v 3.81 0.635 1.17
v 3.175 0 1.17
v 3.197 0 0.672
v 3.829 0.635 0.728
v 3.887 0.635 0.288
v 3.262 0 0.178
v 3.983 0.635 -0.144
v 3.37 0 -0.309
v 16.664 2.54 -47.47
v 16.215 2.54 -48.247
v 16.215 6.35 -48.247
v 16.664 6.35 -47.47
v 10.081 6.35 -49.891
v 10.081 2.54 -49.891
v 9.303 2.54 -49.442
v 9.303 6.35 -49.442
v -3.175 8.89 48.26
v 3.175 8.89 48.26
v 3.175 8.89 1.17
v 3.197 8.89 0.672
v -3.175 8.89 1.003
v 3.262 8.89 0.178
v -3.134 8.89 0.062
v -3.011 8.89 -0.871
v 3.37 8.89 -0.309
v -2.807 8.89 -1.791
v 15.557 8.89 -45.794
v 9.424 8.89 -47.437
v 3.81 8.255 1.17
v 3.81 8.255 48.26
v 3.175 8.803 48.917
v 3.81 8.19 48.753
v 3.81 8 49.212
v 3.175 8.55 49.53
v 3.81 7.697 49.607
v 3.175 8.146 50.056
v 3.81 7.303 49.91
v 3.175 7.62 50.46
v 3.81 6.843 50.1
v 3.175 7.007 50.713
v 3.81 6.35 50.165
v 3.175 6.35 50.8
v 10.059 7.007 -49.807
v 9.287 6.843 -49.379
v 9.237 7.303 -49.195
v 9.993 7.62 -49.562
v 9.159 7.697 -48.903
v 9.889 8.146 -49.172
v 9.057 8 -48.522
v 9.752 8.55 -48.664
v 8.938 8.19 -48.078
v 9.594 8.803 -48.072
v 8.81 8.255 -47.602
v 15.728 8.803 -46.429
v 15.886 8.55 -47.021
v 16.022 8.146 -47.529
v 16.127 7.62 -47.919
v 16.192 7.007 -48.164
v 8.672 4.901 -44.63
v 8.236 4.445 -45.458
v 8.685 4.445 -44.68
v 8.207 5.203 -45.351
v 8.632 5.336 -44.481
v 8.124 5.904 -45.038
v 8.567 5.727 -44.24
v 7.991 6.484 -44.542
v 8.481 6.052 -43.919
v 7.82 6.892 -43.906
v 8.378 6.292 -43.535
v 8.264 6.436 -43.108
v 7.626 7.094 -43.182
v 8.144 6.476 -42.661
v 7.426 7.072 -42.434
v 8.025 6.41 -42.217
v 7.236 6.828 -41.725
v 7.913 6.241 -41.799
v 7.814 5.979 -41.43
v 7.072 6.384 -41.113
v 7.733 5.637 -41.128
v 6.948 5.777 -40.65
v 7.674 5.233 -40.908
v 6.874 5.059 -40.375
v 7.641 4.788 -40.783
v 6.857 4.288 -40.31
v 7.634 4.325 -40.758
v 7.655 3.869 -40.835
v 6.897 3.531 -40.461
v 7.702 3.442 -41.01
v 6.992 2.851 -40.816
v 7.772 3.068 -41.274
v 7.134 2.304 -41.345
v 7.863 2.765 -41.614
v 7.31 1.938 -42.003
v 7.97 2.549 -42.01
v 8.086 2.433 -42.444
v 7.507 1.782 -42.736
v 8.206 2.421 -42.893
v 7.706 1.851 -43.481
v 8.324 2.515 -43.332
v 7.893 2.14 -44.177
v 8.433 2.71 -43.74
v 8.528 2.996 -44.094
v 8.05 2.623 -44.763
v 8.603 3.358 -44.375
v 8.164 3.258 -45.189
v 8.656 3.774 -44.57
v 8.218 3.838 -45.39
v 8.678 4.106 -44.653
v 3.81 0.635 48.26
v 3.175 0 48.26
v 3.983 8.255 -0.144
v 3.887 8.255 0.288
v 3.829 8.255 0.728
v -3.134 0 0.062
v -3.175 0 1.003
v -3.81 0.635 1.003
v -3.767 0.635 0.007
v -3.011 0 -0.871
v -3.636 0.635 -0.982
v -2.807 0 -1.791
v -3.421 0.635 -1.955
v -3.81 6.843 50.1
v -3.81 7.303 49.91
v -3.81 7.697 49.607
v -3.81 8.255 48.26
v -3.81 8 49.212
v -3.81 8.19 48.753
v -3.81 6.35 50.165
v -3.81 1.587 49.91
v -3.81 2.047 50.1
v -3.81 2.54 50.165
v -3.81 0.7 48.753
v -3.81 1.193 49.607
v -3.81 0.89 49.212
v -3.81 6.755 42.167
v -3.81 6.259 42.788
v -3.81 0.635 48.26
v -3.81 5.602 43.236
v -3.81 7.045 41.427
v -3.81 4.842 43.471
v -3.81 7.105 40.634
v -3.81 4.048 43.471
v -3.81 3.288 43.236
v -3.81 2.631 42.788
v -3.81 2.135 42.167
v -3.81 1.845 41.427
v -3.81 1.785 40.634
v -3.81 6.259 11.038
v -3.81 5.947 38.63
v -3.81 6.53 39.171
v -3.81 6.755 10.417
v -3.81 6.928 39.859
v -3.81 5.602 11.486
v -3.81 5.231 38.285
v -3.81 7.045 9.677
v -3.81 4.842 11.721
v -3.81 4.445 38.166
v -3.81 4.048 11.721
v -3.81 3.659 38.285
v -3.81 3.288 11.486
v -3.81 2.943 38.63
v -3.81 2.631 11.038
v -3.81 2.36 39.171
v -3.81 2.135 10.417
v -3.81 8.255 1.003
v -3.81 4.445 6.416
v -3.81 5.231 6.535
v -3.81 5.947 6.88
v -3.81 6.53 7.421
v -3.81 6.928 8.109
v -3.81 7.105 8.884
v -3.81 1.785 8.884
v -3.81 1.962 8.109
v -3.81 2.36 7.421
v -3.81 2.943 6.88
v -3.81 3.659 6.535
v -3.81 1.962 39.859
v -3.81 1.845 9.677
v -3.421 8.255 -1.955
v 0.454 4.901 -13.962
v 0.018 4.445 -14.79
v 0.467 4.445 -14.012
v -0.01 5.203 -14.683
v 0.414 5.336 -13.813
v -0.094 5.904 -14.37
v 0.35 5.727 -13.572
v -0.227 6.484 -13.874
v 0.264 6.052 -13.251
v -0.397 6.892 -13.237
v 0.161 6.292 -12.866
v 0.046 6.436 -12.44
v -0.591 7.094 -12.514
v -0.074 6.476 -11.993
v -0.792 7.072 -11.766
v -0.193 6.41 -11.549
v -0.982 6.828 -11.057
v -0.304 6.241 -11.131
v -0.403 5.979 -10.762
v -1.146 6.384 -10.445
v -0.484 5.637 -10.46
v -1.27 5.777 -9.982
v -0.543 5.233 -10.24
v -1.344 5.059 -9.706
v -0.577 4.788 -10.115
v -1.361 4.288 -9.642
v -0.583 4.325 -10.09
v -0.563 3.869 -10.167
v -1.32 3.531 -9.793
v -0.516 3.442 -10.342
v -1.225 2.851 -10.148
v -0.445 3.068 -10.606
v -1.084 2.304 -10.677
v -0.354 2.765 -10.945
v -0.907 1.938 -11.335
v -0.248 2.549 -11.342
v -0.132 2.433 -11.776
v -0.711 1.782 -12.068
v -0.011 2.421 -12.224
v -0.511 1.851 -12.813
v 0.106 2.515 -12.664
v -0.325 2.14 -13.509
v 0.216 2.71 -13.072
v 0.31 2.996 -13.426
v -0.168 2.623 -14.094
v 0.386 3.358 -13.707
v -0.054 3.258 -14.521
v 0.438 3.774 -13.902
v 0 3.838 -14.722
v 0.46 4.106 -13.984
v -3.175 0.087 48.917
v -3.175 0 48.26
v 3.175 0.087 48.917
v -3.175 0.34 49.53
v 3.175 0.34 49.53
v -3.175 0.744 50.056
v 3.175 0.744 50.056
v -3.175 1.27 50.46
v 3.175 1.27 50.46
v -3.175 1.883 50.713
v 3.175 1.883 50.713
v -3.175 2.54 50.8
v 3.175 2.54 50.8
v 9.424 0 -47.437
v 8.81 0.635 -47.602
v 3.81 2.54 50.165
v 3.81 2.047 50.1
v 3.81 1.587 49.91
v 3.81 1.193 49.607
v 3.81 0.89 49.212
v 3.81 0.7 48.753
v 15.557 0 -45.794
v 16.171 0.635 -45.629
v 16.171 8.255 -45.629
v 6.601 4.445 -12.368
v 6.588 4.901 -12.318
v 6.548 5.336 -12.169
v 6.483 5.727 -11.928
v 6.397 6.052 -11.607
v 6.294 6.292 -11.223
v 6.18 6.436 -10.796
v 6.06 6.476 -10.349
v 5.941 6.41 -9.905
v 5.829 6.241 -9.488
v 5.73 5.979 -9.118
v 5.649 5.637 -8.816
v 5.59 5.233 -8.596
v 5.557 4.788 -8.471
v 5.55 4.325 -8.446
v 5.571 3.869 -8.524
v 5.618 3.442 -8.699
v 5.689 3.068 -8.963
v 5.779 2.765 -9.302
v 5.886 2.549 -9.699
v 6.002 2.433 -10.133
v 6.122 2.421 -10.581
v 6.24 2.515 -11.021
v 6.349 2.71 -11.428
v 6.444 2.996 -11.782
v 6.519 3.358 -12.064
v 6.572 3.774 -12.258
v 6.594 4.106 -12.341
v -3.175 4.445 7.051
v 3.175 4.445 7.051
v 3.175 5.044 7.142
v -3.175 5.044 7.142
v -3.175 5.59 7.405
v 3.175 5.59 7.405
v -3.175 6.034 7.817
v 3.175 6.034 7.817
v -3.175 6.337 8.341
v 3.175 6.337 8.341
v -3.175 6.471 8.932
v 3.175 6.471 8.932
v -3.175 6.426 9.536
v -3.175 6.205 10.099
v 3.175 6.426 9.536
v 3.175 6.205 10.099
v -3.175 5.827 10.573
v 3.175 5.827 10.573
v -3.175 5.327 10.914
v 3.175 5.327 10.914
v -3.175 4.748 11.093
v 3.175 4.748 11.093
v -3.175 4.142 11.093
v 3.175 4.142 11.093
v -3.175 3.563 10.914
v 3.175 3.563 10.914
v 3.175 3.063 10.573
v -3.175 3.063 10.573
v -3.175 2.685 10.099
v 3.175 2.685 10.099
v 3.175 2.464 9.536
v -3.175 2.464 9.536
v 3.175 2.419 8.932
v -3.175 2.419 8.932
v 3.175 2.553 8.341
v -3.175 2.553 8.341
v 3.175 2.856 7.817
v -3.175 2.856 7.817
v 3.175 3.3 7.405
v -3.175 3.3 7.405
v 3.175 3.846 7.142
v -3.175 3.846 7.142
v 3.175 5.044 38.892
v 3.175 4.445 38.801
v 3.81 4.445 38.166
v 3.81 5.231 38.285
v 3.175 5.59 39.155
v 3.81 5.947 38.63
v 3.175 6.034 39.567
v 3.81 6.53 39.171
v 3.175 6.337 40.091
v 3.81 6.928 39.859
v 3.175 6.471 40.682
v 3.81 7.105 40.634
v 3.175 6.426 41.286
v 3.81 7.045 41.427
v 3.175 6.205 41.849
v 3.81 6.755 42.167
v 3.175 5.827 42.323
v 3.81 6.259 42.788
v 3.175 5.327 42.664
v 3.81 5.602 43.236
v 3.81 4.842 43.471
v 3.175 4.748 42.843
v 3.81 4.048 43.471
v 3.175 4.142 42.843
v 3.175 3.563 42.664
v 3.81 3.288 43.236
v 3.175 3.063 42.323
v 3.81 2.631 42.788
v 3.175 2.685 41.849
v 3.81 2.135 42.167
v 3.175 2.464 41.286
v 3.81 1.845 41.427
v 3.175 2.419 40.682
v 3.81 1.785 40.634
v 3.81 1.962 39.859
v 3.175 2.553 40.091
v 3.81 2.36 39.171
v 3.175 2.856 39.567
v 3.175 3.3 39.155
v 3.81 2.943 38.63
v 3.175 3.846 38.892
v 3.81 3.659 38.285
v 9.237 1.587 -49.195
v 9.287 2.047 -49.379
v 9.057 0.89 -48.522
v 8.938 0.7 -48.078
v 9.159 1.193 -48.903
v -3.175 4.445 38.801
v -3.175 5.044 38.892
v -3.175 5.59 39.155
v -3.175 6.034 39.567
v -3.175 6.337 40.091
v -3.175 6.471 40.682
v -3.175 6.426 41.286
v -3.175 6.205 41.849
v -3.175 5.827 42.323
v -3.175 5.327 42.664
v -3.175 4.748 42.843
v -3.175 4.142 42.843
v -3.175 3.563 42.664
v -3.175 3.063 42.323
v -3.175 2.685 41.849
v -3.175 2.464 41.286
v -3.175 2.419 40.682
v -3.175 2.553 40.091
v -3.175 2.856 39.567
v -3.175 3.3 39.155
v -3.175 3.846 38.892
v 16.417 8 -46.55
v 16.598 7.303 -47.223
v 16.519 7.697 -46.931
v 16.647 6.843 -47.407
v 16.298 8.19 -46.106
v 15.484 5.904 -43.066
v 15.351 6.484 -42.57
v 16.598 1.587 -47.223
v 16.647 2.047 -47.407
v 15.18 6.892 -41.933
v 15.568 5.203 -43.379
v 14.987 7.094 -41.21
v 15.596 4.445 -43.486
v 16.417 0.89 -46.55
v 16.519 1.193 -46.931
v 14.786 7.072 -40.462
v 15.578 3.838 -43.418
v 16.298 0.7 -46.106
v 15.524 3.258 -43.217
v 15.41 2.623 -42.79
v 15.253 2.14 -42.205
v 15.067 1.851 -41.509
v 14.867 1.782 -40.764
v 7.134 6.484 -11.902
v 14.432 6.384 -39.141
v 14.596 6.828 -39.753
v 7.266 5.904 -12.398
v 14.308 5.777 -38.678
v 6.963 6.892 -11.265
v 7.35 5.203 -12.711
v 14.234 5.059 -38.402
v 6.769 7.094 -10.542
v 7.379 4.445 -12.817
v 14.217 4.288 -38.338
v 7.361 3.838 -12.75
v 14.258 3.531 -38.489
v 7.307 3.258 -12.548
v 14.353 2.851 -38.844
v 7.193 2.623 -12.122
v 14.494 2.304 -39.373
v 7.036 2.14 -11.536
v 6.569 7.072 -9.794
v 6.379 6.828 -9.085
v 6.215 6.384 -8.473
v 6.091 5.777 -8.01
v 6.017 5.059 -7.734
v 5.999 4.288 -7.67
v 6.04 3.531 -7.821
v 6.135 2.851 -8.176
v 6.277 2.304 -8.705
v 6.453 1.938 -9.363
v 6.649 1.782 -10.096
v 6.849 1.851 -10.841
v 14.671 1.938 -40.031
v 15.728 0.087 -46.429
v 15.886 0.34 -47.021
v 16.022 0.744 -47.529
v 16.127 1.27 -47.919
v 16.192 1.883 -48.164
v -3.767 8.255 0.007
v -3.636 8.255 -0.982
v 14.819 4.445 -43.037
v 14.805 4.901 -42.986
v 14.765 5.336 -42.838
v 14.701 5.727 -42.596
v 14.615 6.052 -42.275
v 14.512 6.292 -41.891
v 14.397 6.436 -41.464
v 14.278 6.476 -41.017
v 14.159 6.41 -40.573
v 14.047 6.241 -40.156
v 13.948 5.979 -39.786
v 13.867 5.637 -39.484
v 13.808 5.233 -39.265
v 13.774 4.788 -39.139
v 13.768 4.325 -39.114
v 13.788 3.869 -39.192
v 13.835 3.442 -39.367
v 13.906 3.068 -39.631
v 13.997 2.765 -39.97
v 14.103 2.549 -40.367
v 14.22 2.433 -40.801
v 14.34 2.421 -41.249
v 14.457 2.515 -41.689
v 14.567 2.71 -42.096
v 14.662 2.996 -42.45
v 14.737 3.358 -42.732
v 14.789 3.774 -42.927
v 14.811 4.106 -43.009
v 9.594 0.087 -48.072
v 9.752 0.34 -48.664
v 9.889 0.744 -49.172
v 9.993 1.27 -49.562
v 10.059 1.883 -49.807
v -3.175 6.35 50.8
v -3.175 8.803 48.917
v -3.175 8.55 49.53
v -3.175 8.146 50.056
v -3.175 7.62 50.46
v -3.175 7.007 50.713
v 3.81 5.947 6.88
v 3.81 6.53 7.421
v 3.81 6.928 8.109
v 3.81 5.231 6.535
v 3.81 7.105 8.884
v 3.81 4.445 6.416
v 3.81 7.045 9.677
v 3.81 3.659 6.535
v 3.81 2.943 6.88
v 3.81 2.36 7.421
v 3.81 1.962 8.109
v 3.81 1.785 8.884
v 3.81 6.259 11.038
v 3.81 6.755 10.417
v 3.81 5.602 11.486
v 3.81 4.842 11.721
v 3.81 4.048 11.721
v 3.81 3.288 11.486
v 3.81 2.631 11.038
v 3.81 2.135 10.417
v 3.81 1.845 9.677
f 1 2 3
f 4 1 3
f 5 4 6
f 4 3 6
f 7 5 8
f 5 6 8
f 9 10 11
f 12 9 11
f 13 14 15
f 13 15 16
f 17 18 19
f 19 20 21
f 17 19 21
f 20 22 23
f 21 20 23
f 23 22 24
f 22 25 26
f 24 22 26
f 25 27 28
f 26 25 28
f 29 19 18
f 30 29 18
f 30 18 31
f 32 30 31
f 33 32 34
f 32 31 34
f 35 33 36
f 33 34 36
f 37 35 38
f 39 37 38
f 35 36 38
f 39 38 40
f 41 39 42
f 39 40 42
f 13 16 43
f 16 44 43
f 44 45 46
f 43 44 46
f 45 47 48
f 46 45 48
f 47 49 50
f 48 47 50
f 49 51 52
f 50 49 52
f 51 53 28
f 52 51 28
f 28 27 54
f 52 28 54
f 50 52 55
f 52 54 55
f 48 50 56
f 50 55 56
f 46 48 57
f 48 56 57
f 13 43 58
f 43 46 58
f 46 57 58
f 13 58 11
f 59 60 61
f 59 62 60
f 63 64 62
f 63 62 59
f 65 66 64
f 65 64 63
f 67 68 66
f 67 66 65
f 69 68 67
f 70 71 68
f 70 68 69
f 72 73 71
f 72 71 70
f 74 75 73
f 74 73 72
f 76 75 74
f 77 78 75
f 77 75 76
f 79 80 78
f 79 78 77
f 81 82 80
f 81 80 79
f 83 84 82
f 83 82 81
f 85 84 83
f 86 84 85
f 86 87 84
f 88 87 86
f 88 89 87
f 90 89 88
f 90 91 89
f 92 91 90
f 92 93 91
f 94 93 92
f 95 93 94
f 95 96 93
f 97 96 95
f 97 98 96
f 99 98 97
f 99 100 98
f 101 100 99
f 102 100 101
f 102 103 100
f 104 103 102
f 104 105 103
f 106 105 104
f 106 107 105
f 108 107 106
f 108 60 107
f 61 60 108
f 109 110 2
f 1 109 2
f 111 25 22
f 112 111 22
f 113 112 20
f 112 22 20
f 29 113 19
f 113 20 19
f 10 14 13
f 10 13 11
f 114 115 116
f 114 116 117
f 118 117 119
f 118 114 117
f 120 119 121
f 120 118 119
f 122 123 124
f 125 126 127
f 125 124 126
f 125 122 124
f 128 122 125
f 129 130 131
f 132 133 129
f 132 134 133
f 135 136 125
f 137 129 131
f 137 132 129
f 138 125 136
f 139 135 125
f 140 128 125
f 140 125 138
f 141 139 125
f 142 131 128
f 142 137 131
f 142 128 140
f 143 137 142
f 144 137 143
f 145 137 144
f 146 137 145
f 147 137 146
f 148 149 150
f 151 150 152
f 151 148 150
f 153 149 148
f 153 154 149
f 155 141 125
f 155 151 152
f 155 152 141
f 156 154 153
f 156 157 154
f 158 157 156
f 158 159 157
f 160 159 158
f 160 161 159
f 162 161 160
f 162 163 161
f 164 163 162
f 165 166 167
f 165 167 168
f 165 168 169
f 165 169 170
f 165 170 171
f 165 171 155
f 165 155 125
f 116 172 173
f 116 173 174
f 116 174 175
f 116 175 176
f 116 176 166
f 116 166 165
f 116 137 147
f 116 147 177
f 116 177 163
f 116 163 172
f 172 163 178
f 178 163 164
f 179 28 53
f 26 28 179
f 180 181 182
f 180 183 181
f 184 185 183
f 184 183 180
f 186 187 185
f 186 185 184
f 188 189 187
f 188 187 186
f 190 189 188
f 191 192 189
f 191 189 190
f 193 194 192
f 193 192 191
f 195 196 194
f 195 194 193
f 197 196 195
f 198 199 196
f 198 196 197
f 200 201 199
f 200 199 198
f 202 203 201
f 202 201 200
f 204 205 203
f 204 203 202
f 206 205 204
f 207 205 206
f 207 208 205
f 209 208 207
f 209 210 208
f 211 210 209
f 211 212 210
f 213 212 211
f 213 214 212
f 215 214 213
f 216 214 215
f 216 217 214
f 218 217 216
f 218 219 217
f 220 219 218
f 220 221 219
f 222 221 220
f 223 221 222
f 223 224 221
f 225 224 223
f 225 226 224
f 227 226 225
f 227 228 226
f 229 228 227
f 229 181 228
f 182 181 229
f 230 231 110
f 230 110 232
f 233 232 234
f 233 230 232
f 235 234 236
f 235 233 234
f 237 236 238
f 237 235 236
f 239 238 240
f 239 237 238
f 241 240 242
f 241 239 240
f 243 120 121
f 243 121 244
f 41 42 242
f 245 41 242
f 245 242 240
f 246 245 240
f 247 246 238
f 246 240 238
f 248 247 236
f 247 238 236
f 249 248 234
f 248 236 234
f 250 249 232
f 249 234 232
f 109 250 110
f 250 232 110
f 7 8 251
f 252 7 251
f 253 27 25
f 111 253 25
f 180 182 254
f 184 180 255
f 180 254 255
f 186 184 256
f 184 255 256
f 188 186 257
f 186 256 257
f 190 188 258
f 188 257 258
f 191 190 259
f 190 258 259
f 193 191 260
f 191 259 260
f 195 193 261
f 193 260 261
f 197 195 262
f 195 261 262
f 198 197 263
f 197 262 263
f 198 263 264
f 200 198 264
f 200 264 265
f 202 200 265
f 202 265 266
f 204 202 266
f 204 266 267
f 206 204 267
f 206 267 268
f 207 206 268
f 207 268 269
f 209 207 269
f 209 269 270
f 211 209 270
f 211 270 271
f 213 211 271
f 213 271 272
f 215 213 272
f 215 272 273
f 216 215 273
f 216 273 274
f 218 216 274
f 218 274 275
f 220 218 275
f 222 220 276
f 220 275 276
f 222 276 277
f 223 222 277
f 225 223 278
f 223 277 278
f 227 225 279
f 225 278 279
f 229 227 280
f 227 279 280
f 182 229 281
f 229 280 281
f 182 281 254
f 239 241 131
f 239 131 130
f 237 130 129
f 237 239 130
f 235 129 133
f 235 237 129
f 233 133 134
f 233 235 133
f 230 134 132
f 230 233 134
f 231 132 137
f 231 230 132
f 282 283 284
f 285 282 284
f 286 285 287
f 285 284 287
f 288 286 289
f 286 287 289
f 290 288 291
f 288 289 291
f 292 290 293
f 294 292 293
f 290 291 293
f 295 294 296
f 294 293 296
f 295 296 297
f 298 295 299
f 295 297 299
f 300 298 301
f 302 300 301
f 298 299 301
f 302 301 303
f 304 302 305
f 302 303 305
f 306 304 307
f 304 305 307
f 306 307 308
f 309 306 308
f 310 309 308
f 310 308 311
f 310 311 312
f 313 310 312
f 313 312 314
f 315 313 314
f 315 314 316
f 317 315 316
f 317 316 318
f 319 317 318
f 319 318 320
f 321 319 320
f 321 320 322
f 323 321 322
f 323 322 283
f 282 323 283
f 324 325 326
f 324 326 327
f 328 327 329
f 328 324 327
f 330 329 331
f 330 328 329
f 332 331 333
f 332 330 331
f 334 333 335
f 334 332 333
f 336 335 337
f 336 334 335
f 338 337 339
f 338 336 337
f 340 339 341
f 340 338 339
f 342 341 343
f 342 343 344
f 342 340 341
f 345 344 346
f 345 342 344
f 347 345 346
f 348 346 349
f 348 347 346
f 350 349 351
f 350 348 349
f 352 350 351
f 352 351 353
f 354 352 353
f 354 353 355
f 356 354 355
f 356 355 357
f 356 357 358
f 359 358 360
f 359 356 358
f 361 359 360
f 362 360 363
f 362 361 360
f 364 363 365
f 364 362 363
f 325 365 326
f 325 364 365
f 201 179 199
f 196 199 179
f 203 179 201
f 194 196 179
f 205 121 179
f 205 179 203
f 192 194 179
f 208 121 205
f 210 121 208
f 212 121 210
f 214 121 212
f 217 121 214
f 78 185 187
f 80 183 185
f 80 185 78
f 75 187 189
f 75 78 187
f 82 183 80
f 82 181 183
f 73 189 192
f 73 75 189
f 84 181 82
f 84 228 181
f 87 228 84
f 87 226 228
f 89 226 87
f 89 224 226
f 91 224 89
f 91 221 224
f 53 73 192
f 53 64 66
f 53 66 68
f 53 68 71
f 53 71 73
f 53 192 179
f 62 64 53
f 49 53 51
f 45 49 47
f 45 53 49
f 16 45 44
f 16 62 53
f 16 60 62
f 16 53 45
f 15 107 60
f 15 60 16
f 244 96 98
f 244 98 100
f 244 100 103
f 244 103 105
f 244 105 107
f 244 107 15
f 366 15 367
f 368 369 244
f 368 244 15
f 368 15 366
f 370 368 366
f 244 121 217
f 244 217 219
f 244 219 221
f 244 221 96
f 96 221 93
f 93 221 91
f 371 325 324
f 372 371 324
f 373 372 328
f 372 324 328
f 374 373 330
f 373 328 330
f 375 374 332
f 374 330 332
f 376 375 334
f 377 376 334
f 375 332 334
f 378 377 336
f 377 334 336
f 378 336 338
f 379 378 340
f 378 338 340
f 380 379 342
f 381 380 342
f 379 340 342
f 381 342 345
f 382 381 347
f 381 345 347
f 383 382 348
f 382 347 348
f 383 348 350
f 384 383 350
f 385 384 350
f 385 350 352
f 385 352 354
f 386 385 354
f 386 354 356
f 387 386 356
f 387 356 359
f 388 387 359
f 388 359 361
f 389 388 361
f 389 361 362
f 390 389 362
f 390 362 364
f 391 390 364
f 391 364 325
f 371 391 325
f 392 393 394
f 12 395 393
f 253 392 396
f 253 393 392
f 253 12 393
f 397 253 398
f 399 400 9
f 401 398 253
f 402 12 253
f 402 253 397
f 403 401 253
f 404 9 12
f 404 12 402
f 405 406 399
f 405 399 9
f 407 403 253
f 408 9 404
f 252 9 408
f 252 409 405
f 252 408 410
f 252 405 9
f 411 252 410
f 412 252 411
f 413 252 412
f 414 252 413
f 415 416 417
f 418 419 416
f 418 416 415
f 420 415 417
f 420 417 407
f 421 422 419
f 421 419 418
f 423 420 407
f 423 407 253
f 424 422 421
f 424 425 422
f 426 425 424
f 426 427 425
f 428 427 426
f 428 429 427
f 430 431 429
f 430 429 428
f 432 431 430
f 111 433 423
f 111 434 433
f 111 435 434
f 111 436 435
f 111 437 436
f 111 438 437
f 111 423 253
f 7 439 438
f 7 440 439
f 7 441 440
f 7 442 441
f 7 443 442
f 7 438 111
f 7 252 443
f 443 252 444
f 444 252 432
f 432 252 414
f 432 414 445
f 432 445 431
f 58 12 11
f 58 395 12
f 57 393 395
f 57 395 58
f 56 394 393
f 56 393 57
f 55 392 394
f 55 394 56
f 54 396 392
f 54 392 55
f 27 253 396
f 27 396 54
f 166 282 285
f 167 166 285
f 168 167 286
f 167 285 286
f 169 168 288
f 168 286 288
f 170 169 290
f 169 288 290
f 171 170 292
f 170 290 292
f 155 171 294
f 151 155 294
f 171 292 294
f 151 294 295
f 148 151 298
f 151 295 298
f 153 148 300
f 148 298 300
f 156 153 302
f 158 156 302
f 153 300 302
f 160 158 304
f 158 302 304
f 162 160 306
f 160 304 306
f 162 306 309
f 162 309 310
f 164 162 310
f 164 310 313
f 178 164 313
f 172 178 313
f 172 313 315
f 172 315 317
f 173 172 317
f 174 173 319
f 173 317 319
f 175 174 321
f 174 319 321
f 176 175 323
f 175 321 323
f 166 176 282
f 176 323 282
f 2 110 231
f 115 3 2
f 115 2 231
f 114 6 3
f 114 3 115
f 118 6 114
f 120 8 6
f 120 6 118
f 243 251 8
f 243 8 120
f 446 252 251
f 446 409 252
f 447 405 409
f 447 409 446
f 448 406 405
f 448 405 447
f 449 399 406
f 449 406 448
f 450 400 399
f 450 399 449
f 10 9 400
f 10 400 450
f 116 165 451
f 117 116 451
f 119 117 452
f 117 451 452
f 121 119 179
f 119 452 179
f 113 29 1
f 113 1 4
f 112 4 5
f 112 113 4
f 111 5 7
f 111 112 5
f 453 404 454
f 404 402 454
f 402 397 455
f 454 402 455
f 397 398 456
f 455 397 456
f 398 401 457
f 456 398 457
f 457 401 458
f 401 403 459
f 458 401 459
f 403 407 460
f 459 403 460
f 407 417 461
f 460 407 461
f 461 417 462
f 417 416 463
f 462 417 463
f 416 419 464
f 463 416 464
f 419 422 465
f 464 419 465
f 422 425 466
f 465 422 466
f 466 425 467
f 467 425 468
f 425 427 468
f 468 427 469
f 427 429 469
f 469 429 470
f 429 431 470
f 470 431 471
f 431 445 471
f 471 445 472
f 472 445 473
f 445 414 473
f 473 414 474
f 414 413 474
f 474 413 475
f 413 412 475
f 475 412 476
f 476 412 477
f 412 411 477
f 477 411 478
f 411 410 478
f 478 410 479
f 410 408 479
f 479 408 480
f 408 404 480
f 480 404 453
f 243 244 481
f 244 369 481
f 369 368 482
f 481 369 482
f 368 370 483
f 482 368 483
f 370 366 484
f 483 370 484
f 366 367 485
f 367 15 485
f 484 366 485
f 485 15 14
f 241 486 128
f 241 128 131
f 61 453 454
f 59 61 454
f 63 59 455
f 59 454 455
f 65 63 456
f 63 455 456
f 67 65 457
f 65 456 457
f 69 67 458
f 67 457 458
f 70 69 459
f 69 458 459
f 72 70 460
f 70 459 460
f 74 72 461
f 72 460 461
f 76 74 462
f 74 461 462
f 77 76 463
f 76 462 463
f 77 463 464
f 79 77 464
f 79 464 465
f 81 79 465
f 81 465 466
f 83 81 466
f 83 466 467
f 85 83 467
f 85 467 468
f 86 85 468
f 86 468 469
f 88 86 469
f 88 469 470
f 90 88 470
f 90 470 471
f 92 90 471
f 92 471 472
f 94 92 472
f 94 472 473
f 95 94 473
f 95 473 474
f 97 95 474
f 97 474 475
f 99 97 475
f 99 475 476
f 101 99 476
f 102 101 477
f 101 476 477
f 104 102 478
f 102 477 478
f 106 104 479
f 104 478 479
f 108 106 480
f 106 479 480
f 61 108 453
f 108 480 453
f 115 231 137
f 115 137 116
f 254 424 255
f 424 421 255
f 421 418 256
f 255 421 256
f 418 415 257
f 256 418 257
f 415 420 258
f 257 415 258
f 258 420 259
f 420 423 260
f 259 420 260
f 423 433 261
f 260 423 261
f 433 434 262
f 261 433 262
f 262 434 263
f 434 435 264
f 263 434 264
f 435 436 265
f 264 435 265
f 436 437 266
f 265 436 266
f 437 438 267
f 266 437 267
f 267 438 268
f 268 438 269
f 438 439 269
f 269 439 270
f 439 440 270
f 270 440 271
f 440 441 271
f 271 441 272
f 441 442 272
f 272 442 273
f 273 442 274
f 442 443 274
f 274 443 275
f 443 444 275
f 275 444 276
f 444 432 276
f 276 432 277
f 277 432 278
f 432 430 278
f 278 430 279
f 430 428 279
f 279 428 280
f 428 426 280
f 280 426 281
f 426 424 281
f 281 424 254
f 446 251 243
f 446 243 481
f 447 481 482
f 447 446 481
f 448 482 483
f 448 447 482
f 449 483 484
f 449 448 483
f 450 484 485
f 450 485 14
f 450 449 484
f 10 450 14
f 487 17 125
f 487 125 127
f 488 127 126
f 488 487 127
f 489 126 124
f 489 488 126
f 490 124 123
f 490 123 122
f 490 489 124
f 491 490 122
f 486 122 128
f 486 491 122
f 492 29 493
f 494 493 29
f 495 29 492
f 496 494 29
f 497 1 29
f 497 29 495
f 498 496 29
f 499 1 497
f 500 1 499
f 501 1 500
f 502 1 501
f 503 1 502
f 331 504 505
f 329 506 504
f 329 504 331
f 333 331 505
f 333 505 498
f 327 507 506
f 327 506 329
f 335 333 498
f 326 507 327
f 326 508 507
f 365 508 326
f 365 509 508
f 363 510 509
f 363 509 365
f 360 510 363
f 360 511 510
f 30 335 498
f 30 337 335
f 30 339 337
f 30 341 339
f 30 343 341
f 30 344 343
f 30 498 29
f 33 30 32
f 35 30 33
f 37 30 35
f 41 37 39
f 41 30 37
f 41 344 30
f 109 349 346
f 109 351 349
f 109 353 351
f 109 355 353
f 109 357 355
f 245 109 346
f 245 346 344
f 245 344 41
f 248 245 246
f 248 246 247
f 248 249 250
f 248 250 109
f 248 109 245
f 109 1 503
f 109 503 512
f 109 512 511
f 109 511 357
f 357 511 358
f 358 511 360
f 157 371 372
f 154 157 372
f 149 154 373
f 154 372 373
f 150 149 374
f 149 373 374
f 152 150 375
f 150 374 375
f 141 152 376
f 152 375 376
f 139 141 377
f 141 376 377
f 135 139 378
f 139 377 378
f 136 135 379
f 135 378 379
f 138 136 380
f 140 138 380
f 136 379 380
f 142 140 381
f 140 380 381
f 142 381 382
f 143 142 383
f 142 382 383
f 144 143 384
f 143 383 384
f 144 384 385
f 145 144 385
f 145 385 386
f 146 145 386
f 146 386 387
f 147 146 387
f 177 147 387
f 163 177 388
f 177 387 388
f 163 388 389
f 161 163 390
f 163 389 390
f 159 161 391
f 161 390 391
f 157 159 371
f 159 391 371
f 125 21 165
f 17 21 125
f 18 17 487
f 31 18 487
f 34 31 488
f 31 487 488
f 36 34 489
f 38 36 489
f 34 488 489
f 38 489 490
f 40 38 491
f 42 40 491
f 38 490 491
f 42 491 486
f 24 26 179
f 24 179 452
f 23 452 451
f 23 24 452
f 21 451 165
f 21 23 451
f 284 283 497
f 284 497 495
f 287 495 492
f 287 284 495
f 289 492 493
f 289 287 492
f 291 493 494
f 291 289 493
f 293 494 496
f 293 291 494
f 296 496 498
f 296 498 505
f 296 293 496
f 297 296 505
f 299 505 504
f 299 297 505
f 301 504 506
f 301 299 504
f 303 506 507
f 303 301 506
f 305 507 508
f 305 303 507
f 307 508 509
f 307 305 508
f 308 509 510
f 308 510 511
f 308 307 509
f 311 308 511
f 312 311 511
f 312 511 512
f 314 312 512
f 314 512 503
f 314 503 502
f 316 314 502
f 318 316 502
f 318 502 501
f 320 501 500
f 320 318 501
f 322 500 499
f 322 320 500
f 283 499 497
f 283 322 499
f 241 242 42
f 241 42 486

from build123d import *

# Parameters (mm, degrees)
BOSS_EXTRUDE1_DEPTH = 8.89
SKETCH2_R           = 2.032
CUT_EXTRUDE1_DEPTH  = 54.189709887
CUT_EXTRUDE2_REACH  = 55.452
SKETCH3_R           = 2.032
FILLET1_R           = 2.54
FILLET2_R           = 5.08
FILLET3_R           = 11.43
CHAMFER1_SIZE       = 0.635


with BuildPart() as part:
    # Sketch1 → Boss-Extrude1 (new body)
    with BuildSketch(Plane(origin=(0, 0, 0), x_dir=(1, 0, 0), z_dir=(0, 1, 0))):
        Polygon((3.81, -0.501596016), (3.81, -50.8), (-3.81, -50.8), (-3.81, 0.501596016), (9.467830093, 50.055132537), (16.828184889, 48.082931414), align=None)
    extrude(amount=BOSS_EXTRUDE1_DEPTH)

    # Sketch2 → Cut-Extrude1 (cut, through all)
    with BuildSketch(Plane(origin=(3.81, 0, 0), x_dir=(0, 0, -1), z_dir=(1, 0, 0))):
        with Locations((-40.833442343, 4.445)):
            Circle(SKETCH2_R)
        with Locations((-9.083442343, 4.445)):
            Circle(SKETCH2_R)
    extrude(amount=-CUT_EXTRUDE1_DEPTH, mode=Mode.SUBTRACT)

    # Sketch3 → Cut-Extrude2 (cut, up to next)
    with BuildSketch(Plane(origin=(3.680177398, 0, 0.986100562), x_dir=(0.25881904510251424, 0, -0.9659258262890701), z_dir=(0.9659258262890701, 0, 0.25881904510251424)), mode=Mode.PRIVATE) as cut_extrude2_sk1:
        with Locations((43.373442343, 4.445)):
            Circle(SKETCH3_R)
    cut_extrude2_tool1 = extrude(cut_extrude2_sk1.sketch, amount=-CUT_EXTRUDE2_REACH, mode=Mode.PRIVATE) & part.part
    # Sketch3 → Cut-Extrude2 (cut, up to next)
    with BuildSketch(Plane(origin=(3.680177398, 0, 0.986100562), x_dir=(0.25881904510251424, 0, -0.9659258262890701), z_dir=(0.9659258262890701, 0, 0.25881904510251424)), mode=Mode.PRIVATE) as cut_extrude2_sk2:
        with Locations((11.623442343, 4.445)):
            Circle(SKETCH3_R)
    cut_extrude2_tool2 = extrude(cut_extrude2_sk2.sketch, amount=-CUT_EXTRUDE2_REACH, mode=Mode.PRIVATE) & part.part
    add(cut_extrude2_tool1.solids().sort_by_distance((14.90605, 4.445, -40.909428))[0], mode=Mode.SUBTRACT)
    add(cut_extrude2_tool2.solids().sort_by_distance((6.688546, 4.445, -10.241283))[0], mode=Mode.SUBTRACT)

    # Fillet1
    fillet1_edges = [part.edges().sort_by_distance(p)[0] for p in [
        (13.148007491, 8.89, -49.069031975),
        (13.148007491, 0, -49.069031975),
        (0, 0, 50.8),
        (0, 8.89, 50.8),
    ]]
    fillet(fillet1_edges, radius=FILLET1_R)

    # Fillet2
    fillet2_edges = [part.edges().sort_by_distance(p)[0] for p in [
        (3.81, 4.445, 0.501596016),
    ]]
    fillet(fillet2_edges, radius=FILLET2_R)

    # Fillet3
    fillet3_edges = [part.edges().sort_by_distance(p)[0] for p in [
        (-3.81, 4.445, -0.501596016),
    ]]
    fillet(fillet3_edges, radius=FILLET3_R)

    # Chamfer1
    chamfer1_edges = [part.edges().sort_by_distance(p)[0] for p in [
        (-3.81, 4.445, 11.115442343),
        (3.81, 4.445, 11.115442343),
        (-3.81, 4.445, 42.865442343),
        (3.81, 4.445, 42.865442343),
        (-1.19772945, 4.445, -10.250722432),
        (6.162625347, 4.445, -8.278521309),
        (7.019775232, 4.445, -40.918867417),
        (14.380130029, 4.445, -38.946666293),
        (9.467830093, 4.445, -50.055132537),
        (16.828184889, 4.445, -48.082931414),
        (9.275281981, 8.146051224, -49.336533201),
        (9.275281981, 0.743948776, -49.336533201),
        (16.635636778, 8.146051224, -47.364332078),
        (16.635636778, 0.743948776, -47.364332078),
        (-3.81, 4.445, 50.8),
        (-3.81, 8.146051224, 50.056051224),
        (-3.81, 0.743948776, 50.056051224),
        (3.81, 4.445, 50.8),
        (3.81, 8.146051224, 50.056051224),
        (3.81, 0.743948776, 50.056051224),
        (10.076940659, 0, -22.88694493),
        (10.076940659, 8.89, -22.88694493),
        (3.81, 0, 24.715195352),
        (3.81, 8.89, 24.715195352),
        (3.853460104, 0, 0.507317647),
        (3.853460104, 8.89, 0.507317647),
        (-3.81, 0, 24.631596016),
        (-3.81, 8.89, 24.631596016),
        (2.694948762, 0, -24.778395296),
        (-3.712214766, 0, -0.488722345),
        (2.694948762, 8.89, -24.778395296),
        (-3.712214766, 8.89, -0.488722345),
    ]]
    chamfer(chamfer1_edges, length=CHAMFER1_SIZE)


solid = part.part
